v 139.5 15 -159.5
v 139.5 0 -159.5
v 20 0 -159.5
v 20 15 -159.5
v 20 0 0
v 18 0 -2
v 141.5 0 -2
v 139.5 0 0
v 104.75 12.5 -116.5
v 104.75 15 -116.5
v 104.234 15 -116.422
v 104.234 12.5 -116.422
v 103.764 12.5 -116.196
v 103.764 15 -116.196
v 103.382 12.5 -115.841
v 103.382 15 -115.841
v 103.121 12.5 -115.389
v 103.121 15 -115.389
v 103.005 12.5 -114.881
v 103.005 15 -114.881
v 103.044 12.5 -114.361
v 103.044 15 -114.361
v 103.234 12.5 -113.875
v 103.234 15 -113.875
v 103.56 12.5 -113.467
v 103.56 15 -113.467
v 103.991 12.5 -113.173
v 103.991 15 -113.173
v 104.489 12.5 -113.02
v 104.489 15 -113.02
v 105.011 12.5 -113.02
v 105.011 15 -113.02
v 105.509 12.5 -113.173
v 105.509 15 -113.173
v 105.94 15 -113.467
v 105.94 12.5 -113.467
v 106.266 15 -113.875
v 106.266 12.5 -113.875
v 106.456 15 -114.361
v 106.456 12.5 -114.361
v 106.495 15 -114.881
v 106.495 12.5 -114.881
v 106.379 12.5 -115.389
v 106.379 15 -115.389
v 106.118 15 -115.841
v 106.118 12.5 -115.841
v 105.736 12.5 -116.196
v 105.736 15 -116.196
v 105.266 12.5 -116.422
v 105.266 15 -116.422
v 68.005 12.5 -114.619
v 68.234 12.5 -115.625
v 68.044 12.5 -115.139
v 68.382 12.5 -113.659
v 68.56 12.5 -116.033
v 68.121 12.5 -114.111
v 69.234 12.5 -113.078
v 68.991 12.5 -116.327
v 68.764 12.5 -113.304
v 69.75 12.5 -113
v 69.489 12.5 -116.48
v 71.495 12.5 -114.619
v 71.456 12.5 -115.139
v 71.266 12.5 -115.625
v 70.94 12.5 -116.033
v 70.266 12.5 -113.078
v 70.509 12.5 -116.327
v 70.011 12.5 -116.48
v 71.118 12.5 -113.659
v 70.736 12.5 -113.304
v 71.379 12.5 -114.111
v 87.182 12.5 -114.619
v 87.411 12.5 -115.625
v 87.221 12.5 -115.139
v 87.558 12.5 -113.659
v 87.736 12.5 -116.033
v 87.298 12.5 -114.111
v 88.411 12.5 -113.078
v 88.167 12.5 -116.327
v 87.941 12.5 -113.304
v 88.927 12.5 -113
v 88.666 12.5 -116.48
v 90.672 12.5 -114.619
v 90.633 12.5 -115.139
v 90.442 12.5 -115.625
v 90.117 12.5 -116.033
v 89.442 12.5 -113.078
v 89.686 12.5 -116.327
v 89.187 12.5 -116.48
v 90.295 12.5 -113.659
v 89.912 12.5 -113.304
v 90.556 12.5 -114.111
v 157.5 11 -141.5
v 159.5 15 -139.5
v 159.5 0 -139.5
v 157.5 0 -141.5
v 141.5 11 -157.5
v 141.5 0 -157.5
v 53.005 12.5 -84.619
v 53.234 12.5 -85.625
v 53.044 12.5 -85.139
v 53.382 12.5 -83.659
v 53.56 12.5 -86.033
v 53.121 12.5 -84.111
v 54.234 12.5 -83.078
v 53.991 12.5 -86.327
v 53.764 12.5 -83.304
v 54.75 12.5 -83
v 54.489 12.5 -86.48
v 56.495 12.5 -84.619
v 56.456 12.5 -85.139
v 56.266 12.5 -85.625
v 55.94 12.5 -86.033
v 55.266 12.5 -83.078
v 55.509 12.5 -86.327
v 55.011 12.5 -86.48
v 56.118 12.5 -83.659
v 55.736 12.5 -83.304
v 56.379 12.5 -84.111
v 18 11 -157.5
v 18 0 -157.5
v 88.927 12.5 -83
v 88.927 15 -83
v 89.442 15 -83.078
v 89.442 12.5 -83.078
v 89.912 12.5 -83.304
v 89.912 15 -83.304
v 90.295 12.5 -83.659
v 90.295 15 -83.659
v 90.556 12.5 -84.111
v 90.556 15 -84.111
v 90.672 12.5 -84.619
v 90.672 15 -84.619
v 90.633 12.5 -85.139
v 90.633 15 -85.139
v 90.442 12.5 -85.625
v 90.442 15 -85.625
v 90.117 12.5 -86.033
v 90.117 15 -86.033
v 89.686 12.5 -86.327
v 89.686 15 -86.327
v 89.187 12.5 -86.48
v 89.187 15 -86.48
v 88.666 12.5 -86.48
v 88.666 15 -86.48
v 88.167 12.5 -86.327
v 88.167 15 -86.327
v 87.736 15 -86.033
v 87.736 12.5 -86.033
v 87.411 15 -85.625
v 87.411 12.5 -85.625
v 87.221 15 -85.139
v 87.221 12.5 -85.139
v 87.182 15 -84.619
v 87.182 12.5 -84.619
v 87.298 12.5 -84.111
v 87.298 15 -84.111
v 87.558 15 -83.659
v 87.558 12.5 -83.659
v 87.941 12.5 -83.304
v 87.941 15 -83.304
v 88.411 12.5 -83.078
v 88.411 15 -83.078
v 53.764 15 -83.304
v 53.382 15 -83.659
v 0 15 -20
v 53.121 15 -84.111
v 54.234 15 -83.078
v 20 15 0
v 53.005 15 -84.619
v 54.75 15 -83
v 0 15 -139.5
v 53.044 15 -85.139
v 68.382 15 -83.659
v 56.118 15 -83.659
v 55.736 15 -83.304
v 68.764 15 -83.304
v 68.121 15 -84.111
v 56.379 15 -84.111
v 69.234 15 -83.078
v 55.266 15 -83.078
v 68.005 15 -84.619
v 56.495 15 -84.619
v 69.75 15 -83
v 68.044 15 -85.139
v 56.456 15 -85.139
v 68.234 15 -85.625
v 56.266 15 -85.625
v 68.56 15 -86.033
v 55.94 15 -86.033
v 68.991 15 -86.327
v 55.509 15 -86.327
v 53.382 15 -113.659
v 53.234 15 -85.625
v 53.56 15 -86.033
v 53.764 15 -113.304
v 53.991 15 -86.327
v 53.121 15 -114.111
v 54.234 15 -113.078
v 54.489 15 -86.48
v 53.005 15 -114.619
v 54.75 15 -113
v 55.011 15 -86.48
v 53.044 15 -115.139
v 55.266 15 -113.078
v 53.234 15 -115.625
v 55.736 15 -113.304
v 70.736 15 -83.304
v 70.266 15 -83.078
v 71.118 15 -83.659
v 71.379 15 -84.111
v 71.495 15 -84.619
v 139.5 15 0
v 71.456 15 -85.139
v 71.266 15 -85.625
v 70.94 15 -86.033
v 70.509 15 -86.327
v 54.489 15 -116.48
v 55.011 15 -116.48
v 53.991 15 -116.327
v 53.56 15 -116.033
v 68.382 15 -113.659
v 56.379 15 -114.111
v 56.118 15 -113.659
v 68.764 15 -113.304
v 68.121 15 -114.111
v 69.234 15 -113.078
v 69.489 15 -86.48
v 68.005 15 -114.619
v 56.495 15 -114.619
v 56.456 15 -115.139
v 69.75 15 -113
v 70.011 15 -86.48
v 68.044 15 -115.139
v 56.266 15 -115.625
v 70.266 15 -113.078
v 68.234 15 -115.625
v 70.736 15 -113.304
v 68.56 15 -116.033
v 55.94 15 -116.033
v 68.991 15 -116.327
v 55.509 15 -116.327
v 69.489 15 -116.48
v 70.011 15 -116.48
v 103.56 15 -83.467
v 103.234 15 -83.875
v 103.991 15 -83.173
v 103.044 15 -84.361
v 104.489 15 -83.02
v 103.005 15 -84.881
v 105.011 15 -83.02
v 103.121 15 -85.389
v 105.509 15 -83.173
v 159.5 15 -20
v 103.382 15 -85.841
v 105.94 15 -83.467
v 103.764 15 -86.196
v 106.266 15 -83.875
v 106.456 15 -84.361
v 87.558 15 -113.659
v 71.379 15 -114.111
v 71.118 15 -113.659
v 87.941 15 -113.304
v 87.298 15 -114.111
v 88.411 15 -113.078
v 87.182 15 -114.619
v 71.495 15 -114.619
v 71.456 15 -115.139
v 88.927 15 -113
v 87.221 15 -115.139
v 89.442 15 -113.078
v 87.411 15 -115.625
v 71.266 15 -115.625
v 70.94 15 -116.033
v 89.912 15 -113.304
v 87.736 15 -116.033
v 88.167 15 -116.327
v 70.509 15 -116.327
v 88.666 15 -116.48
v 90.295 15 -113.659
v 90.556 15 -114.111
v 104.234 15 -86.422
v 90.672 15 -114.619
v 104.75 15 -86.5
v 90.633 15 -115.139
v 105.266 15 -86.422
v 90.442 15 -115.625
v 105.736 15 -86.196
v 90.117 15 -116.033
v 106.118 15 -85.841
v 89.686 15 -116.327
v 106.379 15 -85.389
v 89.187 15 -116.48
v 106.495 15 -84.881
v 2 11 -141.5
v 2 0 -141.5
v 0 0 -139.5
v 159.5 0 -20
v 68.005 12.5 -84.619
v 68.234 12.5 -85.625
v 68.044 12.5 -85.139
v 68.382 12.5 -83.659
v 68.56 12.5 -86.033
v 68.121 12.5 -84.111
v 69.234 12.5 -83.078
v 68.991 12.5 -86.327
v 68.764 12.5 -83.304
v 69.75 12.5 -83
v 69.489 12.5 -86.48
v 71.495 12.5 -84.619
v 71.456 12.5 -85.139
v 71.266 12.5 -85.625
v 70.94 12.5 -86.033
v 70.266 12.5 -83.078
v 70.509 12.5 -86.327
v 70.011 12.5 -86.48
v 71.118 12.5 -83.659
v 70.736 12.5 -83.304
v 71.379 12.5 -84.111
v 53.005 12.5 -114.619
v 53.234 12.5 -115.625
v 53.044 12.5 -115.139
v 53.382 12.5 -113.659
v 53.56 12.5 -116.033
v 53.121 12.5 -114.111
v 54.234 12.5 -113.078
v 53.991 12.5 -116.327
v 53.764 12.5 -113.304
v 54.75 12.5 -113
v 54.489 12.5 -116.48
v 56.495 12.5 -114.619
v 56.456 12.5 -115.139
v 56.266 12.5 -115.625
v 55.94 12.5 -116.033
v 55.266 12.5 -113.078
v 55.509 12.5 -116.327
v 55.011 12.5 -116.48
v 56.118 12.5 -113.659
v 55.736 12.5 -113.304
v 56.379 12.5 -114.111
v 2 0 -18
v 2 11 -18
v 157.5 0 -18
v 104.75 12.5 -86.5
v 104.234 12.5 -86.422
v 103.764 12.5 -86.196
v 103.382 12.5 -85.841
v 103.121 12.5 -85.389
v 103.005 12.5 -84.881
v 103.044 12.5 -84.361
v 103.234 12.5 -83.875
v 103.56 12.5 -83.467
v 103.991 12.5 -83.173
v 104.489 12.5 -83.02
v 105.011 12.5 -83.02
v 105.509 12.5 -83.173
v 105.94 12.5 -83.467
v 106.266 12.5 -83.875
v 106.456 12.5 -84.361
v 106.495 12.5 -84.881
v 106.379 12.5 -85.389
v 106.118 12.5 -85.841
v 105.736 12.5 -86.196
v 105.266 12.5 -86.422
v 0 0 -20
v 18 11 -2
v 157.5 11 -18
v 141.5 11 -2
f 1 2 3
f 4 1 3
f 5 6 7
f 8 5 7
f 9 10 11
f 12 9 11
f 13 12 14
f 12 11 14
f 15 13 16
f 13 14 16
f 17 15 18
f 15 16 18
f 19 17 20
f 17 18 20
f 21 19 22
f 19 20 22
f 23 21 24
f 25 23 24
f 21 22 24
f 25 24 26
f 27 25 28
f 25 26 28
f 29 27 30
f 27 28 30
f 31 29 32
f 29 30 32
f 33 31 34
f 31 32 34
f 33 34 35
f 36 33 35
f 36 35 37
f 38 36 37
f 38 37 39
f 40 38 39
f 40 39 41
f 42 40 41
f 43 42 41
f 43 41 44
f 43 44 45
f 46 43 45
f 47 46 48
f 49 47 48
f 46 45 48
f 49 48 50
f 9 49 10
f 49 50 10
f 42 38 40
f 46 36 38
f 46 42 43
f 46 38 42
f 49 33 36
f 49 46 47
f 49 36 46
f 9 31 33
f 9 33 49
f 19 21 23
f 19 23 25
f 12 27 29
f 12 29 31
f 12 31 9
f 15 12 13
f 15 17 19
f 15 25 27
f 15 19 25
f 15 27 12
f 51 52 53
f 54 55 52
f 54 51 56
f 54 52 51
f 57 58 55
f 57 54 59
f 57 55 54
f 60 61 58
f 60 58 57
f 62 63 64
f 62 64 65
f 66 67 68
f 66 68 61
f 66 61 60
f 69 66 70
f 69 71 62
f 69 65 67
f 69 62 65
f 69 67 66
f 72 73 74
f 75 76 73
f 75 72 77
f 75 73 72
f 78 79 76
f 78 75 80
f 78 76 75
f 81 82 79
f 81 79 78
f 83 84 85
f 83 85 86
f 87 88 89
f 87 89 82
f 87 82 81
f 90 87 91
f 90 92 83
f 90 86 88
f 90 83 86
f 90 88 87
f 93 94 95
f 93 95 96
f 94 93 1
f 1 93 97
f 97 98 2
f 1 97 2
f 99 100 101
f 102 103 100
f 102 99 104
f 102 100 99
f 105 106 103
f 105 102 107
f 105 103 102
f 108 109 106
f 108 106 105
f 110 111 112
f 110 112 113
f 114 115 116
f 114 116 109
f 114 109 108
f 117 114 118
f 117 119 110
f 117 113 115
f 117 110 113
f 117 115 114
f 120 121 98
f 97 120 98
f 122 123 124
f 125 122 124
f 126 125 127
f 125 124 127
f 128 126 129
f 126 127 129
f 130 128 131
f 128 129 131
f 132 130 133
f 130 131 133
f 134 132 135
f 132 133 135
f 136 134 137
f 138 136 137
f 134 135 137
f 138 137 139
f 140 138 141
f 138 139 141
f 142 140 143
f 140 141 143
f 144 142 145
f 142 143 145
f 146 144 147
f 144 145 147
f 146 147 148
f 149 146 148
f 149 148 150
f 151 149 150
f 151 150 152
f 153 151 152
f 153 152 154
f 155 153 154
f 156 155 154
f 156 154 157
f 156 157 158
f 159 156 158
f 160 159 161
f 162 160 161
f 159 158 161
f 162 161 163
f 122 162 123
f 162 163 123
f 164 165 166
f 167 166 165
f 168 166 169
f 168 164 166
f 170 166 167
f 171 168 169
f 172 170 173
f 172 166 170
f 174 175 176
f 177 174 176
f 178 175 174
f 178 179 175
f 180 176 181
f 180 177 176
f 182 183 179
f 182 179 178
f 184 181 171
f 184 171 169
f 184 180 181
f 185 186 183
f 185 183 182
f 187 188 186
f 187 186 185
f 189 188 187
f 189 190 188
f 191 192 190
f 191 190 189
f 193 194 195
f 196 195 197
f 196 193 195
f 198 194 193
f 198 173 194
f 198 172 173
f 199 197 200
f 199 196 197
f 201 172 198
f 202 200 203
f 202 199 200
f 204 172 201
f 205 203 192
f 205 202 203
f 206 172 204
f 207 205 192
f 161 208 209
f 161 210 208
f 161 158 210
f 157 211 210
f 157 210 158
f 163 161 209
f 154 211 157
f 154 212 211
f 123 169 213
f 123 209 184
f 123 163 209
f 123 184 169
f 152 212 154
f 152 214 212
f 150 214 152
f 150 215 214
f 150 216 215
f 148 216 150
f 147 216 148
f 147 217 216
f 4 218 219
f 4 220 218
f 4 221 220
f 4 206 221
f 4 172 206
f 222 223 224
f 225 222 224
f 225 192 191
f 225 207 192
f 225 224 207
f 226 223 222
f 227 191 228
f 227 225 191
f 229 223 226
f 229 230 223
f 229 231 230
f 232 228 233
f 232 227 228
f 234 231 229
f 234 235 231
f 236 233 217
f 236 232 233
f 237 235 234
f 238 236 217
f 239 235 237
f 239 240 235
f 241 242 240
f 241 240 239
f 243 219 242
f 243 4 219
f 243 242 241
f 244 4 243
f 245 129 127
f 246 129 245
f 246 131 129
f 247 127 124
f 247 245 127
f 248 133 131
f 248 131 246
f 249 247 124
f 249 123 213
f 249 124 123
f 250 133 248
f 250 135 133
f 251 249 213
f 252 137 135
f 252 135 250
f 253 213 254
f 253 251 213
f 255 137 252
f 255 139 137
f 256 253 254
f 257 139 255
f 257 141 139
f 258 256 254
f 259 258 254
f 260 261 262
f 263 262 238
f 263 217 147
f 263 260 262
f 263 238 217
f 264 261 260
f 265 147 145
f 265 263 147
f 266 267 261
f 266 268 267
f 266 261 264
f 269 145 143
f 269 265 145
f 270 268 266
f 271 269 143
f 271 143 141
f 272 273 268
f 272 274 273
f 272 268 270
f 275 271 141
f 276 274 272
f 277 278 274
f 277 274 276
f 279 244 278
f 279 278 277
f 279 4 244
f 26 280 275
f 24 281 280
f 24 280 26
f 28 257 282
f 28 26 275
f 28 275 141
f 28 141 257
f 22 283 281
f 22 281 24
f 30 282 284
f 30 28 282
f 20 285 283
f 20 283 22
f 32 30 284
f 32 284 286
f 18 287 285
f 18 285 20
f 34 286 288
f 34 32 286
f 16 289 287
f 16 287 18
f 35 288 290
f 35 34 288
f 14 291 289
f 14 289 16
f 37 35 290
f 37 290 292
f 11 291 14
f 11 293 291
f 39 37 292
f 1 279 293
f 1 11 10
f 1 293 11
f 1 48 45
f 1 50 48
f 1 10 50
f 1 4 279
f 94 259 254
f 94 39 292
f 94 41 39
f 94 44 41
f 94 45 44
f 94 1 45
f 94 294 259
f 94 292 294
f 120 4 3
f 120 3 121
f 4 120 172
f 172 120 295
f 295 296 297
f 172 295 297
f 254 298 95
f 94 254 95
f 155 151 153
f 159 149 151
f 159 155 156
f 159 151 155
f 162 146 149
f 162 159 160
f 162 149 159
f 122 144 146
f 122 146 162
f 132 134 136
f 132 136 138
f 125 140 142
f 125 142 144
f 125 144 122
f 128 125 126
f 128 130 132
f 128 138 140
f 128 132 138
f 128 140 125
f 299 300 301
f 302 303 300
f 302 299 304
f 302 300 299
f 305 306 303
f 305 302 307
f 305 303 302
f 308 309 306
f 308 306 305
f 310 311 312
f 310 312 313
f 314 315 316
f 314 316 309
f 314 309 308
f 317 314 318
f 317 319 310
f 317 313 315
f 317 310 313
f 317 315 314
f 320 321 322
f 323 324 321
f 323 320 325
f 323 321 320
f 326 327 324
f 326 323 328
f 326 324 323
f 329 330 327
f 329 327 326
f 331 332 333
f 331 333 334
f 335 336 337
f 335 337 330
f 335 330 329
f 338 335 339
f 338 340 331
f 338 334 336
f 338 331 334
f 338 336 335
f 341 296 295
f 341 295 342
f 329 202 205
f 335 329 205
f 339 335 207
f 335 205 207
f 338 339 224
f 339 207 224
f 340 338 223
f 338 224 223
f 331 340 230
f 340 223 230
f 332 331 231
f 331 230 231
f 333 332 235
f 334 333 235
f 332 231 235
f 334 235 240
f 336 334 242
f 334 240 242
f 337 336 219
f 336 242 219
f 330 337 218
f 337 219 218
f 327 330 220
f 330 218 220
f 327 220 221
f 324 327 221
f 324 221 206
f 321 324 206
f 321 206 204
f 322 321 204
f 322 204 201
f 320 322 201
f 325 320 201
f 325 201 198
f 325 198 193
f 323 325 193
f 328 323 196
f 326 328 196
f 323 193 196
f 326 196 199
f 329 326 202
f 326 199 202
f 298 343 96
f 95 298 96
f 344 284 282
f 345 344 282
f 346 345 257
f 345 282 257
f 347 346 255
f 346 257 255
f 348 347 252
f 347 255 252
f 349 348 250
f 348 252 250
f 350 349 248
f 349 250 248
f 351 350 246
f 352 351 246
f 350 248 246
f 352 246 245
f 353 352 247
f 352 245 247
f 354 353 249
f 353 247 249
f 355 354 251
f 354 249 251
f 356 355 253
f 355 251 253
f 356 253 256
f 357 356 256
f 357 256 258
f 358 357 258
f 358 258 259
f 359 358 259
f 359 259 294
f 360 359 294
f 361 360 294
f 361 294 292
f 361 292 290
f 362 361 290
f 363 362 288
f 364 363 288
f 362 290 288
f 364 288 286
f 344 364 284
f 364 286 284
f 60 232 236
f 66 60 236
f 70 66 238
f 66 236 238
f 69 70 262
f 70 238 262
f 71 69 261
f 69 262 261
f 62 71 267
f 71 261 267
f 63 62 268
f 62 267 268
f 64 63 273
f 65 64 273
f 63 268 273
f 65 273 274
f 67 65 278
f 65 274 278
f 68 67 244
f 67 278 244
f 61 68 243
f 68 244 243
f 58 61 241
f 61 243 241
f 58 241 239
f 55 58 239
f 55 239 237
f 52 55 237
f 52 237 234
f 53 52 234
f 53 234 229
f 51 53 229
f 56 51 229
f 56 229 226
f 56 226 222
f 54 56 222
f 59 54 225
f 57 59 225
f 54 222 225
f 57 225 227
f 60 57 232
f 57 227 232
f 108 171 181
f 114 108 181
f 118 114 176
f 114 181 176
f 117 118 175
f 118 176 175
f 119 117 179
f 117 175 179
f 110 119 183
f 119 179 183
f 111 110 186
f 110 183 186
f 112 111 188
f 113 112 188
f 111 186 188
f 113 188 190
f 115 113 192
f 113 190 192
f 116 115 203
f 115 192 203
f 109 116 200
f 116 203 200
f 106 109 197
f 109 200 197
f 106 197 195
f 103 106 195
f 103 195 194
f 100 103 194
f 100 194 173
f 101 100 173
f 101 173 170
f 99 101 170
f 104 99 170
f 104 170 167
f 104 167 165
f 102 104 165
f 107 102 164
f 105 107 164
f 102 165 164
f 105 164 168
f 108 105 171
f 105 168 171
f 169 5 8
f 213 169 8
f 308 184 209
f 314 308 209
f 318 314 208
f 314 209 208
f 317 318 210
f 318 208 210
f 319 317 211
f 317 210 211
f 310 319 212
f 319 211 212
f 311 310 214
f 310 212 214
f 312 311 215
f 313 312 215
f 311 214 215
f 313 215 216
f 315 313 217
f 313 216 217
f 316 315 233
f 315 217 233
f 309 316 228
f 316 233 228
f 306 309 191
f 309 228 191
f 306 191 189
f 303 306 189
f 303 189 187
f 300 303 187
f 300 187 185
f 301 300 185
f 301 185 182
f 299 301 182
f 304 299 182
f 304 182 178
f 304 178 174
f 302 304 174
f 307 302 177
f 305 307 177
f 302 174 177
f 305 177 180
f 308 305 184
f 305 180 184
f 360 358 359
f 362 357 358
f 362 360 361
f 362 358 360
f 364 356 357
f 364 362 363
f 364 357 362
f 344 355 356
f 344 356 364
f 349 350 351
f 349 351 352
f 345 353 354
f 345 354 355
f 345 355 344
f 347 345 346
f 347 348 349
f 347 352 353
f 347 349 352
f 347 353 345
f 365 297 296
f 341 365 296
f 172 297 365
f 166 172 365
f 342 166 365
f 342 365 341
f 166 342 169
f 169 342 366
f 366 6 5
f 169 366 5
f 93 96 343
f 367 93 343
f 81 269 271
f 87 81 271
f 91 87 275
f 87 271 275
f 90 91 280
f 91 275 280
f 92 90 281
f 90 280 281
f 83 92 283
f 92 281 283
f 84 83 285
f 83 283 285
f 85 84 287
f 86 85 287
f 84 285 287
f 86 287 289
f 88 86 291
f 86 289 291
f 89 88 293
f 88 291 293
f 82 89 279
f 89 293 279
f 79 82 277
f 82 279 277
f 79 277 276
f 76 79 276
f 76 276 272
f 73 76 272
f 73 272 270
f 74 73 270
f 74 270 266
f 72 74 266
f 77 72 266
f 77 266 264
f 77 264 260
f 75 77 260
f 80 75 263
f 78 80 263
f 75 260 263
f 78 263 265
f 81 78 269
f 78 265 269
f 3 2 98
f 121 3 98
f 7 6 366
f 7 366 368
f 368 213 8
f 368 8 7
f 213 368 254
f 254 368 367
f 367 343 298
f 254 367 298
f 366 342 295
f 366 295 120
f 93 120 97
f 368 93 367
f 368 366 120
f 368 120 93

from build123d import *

# Parameters (mm, degrees)
BOSS_EXTRUDE1_DEPTH = 15
SKETCH5_W           = 155.5
SKETCH5_H           = 155.5
CUT_EXTRUDE3_DEPTH  = 11
SKETCH7_R           = 1.75
CUT_EXTRUDE4_DEPTH  = 2.5


with BuildPart() as part:
    # Sketch1 → Boss-Extrude1 (new body)
    with BuildSketch(Plane(origin=(0, 0, 0), x_dir=(1, 0, 0), z_dir=(0, 1, 0))):
        Polygon((20, 159.5), (0, 139.5), (0, 20), (20, 0), (139.5, 0), (159.5, 20), (159.5, 139.5), (139.5, 159.5), align=None)
    extrude(amount=BOSS_EXTRUDE1_DEPTH)

    # Sketch5 → Cut-Extrude3 (cut)
    with BuildSketch(Plane.XZ):
        with Locations((79.75, -79.75)):
            Rectangle(SKETCH5_W, SKETCH5_H)
    extrude(amount=-CUT_EXTRUDE3_DEPTH, mode=Mode.SUBTRACT)

    # Sketch7 → Cut-Extrude4 (cut)
    with BuildSketch(Plane(origin=(0, 15, 0), x_dir=(1, 0, 0), z_dir=(0, 1, 0))):
        with Locations(Location((54.75, 114.75, 0), (0, 0, 270))):
            Circle(SKETCH7_R)
        with Locations(Location((104.75, 114.75, 0), (0, 0, 90))):
            Circle(SKETCH7_R)
        with Locations(Location((69.75, 114.75, 0), (0, 0, 270))):
            Circle(SKETCH7_R)
        with Locations(Location((88.92664449, 114.75, 0), (0, 0, 270))):
            Circle(SKETCH7_R)
        with Locations(Location((54.75, 84.75, 0), (0, 0, 270))):
            Circle(SKETCH7_R)
        with Locations(Location((69.75, 84.75, 0), (0, 0, 270))):
            Circle(SKETCH7_R)
        with Locations(Location((88.92664449, 84.75, 0), (0, 0, 270))):
            Circle(SKETCH7_R)
        with Locations(Location((104.75, 84.75, 0), (0, 0, 90))):
            Circle(SKETCH7_R)
    extrude(amount=-CUT_EXTRUDE4_DEPTH, mode=Mode.SUBTRACT)


solid = part.part
